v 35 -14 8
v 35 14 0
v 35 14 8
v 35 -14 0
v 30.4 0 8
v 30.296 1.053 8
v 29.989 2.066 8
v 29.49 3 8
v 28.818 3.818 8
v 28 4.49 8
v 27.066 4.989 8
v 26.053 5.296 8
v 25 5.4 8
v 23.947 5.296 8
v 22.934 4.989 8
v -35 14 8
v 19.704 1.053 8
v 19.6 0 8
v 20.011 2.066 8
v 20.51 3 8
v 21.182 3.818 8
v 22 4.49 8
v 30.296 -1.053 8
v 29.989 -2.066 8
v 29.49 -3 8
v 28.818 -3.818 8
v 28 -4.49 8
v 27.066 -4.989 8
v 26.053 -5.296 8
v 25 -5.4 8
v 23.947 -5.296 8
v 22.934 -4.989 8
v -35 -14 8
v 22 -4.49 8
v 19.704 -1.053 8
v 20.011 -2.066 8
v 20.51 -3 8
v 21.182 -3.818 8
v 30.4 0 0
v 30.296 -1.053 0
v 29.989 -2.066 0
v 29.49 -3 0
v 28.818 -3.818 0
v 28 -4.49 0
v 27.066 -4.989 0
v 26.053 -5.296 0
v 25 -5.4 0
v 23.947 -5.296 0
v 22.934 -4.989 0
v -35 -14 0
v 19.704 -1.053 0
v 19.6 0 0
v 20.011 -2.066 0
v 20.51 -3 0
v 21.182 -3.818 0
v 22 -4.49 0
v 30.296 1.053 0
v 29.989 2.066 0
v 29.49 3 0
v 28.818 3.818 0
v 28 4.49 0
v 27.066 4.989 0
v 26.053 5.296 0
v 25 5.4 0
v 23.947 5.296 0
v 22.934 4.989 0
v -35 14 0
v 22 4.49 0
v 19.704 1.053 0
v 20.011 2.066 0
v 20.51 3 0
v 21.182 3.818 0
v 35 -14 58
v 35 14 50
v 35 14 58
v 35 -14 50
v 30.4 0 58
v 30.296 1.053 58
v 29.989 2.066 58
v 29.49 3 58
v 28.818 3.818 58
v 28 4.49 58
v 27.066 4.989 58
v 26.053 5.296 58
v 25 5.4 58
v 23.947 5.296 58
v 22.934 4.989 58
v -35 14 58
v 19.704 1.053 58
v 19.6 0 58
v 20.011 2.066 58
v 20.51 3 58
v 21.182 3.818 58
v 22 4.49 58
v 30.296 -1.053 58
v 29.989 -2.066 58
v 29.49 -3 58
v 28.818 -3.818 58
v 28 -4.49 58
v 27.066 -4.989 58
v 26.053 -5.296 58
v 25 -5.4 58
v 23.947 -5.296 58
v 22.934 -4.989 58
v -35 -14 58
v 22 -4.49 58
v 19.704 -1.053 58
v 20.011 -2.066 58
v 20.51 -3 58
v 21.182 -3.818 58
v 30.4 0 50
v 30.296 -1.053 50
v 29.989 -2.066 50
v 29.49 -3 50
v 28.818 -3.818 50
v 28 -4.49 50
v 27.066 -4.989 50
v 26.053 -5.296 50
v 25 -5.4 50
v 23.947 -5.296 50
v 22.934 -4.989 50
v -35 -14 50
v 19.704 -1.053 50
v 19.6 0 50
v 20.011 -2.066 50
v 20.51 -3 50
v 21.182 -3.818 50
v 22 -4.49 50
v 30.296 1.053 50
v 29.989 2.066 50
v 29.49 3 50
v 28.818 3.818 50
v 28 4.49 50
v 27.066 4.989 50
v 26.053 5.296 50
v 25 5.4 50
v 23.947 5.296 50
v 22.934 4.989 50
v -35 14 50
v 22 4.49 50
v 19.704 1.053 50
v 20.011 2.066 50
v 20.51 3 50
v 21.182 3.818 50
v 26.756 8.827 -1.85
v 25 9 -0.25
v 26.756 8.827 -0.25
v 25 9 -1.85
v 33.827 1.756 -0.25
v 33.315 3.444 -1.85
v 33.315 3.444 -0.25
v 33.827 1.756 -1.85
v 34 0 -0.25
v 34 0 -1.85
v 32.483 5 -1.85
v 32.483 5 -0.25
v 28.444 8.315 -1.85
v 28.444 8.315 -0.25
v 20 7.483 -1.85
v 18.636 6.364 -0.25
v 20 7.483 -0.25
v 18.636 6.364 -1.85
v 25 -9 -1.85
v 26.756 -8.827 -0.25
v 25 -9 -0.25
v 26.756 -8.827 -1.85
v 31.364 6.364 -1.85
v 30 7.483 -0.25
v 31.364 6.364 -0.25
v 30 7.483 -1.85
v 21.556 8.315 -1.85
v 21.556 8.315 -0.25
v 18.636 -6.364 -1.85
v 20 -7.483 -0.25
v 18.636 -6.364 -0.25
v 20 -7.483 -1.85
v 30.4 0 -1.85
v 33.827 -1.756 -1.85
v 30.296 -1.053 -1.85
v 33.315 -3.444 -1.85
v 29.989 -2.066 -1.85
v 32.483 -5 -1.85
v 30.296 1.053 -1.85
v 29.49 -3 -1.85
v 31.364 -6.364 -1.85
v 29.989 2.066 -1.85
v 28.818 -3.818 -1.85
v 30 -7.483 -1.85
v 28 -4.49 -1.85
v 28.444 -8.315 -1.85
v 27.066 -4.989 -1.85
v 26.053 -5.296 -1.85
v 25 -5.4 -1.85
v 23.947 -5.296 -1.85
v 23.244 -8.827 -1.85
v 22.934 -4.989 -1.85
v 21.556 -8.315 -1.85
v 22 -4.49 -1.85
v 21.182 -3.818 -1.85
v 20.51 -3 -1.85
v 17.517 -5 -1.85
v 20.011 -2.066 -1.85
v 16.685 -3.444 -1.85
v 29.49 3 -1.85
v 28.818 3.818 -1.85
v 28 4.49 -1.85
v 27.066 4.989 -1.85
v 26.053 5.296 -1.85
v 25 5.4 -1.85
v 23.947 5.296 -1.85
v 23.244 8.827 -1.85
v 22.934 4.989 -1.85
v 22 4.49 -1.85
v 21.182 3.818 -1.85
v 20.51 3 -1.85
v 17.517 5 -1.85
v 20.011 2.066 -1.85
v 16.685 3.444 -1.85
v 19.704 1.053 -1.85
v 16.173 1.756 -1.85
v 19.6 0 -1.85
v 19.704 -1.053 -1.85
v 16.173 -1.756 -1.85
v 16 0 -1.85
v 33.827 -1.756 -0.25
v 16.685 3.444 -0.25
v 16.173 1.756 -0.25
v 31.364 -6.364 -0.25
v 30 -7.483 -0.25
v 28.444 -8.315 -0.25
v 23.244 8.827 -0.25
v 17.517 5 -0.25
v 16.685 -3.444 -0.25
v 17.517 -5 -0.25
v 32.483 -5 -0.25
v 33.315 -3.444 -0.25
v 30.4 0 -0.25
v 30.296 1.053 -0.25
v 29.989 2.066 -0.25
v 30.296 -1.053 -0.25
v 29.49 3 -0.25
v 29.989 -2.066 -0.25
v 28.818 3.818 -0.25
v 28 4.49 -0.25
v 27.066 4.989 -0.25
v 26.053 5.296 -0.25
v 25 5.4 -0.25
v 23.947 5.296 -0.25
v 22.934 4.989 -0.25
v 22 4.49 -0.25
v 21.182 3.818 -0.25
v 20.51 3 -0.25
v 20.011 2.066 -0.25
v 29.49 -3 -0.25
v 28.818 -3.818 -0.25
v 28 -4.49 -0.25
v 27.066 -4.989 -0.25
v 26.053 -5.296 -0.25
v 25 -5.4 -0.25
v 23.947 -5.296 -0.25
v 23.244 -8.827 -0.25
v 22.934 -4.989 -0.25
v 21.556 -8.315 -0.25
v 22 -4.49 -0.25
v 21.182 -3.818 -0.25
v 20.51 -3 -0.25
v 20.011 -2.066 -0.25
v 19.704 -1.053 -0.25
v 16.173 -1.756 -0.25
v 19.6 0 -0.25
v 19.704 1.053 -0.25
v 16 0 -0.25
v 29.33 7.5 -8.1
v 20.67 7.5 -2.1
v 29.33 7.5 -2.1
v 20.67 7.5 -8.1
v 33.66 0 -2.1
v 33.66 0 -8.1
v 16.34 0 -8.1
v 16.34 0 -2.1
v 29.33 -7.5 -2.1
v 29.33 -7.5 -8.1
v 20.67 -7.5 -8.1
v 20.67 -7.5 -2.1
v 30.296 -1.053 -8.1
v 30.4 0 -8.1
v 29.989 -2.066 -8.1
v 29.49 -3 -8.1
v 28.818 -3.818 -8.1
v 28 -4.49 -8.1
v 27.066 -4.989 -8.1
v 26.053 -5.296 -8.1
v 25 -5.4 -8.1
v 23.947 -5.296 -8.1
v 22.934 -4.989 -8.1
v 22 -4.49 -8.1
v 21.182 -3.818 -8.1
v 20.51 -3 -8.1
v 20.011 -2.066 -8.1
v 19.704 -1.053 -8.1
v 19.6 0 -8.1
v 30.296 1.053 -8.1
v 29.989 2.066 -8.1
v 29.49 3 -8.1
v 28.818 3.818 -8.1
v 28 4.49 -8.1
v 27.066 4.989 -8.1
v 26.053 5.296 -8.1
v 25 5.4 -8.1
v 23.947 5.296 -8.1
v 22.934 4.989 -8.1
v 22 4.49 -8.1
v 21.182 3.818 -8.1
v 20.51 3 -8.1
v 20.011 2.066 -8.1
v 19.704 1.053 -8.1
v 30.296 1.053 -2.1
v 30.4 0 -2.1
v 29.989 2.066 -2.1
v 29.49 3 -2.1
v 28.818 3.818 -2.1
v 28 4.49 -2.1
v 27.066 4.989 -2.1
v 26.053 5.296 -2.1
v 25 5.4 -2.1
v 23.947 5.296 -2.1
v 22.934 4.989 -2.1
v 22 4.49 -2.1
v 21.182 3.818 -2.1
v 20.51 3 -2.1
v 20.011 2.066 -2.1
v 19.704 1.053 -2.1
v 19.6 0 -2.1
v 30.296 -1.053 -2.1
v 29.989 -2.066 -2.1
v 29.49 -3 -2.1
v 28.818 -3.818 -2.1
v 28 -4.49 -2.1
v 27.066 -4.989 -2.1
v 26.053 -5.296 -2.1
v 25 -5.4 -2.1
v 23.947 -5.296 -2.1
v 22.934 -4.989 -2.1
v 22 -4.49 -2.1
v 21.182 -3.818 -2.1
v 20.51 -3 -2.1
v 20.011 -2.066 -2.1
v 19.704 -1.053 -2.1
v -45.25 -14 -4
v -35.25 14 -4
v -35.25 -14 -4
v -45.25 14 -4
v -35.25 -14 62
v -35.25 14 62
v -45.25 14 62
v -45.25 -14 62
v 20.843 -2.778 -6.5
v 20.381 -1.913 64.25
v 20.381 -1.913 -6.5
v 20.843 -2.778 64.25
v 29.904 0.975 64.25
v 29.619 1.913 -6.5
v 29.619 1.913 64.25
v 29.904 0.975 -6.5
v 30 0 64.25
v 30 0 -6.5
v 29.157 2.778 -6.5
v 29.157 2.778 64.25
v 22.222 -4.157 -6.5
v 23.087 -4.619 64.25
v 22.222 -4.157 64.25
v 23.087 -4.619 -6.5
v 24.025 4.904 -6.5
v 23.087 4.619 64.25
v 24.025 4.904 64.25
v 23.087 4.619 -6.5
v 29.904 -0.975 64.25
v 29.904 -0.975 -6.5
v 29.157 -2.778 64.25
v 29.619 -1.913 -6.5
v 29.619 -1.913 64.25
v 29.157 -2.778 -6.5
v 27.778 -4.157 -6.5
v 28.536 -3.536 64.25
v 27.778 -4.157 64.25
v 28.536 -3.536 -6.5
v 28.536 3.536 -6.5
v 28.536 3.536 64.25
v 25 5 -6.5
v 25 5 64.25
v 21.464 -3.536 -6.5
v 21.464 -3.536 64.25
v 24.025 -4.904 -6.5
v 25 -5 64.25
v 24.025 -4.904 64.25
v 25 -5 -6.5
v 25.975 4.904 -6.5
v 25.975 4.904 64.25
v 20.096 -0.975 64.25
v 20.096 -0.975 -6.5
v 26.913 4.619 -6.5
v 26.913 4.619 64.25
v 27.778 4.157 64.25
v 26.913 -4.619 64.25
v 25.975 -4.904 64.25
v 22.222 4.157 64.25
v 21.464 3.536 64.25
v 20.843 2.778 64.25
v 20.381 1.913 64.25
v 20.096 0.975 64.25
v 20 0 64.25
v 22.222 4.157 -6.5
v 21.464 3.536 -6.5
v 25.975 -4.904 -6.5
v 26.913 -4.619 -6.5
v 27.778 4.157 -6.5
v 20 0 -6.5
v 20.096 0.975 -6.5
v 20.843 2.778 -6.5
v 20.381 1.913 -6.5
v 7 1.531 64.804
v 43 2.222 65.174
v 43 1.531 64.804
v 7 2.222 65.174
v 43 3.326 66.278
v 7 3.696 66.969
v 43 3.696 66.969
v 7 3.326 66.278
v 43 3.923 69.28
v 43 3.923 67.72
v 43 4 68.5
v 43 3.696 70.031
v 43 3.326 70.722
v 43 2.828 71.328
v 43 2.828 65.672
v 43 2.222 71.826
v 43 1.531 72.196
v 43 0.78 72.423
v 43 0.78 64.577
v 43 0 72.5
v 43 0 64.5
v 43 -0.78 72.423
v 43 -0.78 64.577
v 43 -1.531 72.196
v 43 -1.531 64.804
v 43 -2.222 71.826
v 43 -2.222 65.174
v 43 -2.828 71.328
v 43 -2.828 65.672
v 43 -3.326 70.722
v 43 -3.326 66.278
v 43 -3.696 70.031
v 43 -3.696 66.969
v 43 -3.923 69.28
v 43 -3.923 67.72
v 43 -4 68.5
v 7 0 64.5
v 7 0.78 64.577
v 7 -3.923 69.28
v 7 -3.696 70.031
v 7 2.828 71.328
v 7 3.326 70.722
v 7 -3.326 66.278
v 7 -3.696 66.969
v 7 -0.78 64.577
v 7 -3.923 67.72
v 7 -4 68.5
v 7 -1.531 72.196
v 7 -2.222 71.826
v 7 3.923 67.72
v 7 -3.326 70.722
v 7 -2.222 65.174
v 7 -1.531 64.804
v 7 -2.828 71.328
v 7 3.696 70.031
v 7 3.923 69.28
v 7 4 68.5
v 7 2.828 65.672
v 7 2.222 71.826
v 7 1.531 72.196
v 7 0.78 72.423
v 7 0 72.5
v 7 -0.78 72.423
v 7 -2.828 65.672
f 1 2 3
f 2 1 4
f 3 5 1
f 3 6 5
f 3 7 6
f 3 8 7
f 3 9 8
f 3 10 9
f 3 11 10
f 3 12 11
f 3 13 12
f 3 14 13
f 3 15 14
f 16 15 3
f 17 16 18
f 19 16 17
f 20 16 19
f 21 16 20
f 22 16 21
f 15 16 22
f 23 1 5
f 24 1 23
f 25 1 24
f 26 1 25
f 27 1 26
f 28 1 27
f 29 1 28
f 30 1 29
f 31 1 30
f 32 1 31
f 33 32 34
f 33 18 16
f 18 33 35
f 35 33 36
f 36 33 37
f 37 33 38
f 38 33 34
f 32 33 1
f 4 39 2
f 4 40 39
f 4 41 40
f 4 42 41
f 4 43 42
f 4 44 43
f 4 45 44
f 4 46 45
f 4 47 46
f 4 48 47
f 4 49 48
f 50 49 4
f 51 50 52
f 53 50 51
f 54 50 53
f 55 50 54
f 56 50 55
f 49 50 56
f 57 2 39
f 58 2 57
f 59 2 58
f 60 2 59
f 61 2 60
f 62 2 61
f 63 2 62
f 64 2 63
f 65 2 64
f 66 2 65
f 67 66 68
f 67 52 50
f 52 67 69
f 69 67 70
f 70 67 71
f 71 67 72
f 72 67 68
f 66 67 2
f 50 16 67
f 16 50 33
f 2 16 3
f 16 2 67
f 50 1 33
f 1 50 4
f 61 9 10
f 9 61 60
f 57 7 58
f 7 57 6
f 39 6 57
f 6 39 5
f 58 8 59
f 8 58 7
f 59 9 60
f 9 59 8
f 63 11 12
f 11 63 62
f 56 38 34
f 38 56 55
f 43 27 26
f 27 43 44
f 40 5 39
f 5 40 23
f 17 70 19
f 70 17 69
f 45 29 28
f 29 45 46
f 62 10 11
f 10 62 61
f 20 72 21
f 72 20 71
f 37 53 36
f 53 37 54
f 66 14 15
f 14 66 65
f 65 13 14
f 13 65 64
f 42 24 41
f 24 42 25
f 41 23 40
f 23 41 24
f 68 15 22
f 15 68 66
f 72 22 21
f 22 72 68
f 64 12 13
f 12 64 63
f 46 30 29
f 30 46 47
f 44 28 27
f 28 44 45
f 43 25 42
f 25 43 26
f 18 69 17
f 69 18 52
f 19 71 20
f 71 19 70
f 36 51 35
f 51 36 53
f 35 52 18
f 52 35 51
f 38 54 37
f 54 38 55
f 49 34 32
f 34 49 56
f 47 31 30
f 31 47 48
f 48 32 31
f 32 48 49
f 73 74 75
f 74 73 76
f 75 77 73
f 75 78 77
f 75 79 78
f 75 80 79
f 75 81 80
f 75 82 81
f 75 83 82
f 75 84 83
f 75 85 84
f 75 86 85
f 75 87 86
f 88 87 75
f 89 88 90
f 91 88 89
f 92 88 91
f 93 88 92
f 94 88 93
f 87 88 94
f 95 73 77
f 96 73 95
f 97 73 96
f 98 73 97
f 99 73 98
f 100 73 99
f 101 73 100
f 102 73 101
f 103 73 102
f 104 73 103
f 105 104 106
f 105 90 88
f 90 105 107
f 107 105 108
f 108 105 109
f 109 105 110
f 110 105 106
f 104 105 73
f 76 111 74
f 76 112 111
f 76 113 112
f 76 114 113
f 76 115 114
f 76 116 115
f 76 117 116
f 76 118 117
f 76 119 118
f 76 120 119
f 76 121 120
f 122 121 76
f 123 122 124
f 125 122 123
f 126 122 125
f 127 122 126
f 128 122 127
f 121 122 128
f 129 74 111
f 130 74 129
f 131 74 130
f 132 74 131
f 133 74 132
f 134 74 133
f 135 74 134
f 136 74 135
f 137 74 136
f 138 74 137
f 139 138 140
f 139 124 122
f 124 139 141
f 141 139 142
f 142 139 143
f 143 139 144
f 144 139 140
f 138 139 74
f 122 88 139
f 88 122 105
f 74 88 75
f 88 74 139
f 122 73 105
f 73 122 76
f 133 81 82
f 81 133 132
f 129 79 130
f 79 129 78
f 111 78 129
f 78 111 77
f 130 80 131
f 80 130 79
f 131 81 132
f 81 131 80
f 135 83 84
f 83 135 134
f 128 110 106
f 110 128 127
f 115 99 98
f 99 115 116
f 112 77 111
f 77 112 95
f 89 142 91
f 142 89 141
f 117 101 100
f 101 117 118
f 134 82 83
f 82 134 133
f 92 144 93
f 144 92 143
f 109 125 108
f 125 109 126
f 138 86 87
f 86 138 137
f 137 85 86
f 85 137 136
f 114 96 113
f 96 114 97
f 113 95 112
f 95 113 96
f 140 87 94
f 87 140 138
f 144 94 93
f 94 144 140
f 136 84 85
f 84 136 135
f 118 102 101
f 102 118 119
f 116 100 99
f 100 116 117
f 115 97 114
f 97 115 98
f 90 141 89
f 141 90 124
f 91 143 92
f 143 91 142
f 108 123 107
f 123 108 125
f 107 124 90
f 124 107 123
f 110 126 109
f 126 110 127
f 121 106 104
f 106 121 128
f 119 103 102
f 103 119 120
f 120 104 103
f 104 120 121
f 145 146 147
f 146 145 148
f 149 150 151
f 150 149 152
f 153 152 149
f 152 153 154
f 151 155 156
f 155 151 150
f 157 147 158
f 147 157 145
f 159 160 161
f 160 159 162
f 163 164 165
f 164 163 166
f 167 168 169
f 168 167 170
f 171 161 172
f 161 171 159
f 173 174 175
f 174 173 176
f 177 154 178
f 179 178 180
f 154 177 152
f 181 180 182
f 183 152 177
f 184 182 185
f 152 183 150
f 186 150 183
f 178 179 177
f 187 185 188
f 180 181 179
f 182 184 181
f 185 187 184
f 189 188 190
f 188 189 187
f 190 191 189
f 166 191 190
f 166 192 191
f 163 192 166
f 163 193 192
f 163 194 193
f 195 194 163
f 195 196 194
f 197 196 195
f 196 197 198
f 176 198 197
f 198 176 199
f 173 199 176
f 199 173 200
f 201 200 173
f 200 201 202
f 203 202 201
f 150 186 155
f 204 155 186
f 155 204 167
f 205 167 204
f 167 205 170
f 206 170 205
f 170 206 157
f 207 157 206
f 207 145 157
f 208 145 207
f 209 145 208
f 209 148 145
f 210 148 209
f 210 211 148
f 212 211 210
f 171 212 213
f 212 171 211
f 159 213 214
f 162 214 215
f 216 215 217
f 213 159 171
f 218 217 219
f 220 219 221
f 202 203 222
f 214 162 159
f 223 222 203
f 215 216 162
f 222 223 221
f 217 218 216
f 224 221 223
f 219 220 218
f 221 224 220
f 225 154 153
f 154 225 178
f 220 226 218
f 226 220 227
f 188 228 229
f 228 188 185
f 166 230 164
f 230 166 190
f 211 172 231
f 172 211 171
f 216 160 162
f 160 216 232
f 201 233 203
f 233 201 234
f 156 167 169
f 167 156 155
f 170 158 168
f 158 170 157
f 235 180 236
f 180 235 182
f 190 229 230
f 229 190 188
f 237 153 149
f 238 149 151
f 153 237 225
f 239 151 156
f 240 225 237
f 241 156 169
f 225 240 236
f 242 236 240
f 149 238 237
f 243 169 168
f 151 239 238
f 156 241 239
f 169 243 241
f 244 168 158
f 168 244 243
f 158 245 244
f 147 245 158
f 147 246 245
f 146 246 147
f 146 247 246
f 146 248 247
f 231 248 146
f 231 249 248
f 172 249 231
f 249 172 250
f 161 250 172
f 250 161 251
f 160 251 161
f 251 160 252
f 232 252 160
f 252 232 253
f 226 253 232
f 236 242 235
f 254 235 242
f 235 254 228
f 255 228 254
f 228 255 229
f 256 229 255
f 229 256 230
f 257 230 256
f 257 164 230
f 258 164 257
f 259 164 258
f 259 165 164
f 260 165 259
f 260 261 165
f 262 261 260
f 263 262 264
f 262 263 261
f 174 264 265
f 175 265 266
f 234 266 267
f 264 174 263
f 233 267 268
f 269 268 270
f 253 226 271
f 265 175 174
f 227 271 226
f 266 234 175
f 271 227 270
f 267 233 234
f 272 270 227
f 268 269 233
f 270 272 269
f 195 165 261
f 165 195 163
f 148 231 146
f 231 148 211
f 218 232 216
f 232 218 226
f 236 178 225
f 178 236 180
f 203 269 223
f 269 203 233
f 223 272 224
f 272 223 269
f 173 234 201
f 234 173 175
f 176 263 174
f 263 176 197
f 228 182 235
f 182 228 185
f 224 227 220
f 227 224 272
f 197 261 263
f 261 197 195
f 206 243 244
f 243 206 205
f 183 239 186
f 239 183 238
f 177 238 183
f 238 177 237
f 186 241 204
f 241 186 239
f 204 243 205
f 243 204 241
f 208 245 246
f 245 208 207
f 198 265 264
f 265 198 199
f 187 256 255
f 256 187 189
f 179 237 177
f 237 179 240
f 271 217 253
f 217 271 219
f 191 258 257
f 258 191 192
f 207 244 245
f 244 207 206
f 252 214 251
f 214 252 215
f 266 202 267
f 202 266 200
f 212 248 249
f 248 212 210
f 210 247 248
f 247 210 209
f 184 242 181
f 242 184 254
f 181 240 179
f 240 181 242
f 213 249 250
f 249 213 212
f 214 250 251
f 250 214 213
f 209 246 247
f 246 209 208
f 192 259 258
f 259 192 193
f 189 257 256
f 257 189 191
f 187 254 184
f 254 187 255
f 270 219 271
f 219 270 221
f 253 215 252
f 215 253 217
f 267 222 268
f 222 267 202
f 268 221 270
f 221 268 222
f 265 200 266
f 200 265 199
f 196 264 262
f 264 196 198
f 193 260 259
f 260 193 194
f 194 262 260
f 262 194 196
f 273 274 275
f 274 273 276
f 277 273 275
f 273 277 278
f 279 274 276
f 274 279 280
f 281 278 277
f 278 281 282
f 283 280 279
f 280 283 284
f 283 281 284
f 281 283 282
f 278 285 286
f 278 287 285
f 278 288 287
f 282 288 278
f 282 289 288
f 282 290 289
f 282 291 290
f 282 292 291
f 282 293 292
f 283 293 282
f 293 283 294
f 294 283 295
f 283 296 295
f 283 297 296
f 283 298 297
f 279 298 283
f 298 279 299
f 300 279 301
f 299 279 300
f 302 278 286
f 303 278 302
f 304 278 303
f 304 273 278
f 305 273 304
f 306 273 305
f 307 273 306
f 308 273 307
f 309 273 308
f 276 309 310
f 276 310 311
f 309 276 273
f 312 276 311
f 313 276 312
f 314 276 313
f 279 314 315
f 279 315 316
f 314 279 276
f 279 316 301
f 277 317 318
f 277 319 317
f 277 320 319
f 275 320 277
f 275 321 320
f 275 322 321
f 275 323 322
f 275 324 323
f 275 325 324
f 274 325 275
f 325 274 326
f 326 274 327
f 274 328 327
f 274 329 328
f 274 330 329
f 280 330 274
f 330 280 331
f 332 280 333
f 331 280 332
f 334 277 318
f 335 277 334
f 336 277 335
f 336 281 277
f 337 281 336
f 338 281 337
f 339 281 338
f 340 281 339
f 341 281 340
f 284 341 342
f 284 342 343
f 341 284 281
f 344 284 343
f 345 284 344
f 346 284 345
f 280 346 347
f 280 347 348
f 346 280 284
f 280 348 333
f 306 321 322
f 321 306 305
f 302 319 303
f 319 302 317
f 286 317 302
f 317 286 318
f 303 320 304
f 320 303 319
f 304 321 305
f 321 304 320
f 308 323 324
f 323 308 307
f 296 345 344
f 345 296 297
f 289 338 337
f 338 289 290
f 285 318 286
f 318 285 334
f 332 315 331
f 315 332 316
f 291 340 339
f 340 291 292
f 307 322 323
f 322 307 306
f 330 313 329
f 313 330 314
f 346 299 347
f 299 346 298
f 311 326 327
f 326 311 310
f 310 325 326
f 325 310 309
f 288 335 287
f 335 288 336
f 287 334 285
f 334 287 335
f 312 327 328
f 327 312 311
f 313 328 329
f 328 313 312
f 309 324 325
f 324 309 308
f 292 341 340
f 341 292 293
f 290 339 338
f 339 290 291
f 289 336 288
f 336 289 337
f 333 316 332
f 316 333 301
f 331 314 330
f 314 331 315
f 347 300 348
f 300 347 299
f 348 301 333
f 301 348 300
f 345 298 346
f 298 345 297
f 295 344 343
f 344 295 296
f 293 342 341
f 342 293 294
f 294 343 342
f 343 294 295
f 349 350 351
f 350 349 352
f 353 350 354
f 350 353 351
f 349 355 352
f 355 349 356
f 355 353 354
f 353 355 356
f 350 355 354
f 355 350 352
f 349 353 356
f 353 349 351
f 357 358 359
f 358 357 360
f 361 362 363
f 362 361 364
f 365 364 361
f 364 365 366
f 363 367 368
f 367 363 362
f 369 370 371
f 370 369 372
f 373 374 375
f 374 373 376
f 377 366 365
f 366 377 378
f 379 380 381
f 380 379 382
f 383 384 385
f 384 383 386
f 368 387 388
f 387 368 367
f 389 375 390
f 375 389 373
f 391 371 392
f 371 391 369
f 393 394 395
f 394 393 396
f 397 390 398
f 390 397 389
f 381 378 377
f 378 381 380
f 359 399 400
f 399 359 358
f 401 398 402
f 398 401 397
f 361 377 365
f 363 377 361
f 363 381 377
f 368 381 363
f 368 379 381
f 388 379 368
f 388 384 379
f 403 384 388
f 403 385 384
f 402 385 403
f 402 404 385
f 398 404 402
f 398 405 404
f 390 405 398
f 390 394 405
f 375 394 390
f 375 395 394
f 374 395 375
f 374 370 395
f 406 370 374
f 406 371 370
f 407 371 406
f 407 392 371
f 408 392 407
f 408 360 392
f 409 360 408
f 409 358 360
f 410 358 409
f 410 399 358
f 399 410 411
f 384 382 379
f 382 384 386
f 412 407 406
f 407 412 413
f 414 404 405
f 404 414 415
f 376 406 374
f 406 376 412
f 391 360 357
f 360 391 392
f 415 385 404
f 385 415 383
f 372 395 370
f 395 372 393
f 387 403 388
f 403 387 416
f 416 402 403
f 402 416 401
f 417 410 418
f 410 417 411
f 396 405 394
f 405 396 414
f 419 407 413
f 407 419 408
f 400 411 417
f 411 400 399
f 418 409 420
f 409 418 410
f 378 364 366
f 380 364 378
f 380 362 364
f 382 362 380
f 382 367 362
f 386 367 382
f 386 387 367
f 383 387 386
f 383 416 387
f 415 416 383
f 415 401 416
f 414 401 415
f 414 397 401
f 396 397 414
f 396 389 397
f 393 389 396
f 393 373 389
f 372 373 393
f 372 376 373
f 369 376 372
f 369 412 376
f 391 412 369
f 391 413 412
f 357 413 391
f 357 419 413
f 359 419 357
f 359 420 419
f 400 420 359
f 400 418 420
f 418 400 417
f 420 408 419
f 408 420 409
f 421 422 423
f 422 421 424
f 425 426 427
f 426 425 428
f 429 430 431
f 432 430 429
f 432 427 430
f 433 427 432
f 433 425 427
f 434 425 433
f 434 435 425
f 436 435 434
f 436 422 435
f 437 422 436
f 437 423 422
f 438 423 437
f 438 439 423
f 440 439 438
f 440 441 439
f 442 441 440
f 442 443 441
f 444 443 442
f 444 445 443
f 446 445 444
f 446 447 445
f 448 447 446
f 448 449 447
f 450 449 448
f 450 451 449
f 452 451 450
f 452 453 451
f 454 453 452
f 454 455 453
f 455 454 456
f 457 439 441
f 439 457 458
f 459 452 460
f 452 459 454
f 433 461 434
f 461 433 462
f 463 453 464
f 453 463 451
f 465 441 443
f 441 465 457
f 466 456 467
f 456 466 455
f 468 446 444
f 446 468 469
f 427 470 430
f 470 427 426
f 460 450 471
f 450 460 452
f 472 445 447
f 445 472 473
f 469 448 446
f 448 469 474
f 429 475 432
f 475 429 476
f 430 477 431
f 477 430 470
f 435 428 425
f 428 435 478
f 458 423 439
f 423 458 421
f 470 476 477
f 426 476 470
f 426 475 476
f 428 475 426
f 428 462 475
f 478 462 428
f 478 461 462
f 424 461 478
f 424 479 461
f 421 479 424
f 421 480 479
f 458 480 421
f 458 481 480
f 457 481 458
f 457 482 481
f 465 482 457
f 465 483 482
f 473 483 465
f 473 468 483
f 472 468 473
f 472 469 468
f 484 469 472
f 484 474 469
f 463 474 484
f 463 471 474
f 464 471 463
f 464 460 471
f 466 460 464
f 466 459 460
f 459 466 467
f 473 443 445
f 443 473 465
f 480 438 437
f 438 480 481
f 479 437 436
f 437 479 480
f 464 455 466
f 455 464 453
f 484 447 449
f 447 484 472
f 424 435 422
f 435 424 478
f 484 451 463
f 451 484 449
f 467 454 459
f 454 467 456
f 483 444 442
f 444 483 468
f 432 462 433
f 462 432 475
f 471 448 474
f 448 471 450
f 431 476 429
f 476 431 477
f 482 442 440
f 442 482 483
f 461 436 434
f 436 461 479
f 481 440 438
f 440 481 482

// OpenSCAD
$fn = 32;

// ------------------------------------------------------------------------
// C clamp: throat 50 mm, screw d10
// Every part is its own module, assembly() places every instance.
// ------------------------------------------------------------------------

// --- part 1 ---
module clamp_arm() {
  difference() {
    translate([-35, -14, 0]) cube([70, 28, 8]);
    translate([25, 0, -1]) cylinder(h = 10, d = 10.8);
  }
}

// --- part 2 ---
module clamp_spine() {
  difference() {
    translate([-33, -14, 0]) cube([66, 28, 10]);
  }
}

// --- part 3 ---
module clamp_screw() {
  translate([0, 0, -35.375]) cylinder(h = 70.75, d = 10);
}

// --- part 4 ---
module clamp_washer() {
  difference() {
      translate([0, 0, 0]) cylinder(h = 1.6, d = 18);
      translate([0, 0, -1]) cylinder(h = 3.6, d = 10.8);
    }
}

// --- part 5 ---
module clamp_nut() {
  difference() {
    linear_extrude(height = 6) polygon(points = [[8.66, 0], [4.33, 7.5], [-4.33, 7.5], [-8.66, 0], [-4.33, -7.5], [4.33, -7.5]]);
    translate([0, 0, -1]) cylinder(h = 8, d = 10.8);
  }
}

// --- part 6 ---
module tommy_bar() {
  translate([0, 0, -18]) cylinder(h = 36, d = 8);
}

// --- assembly ---
module assembly() {
  color([0.80, 0.24, 0.20]) translate([0, 0, 0]) rotate([0, 0, 0]) clamp_arm();
  color([0.20, 0.45, 0.75]) translate([0, 0, 50]) rotate([0, 0, 0]) clamp_arm();
  color([0.25, 0.62, 0.32]) translate([-45.25, 0, 29]) rotate([0, 90, 0]) clamp_spine();
  color([0.92, 0.70, 0.18]) translate([25, 0, 28.875]) rotate([0, 0, 0]) clamp_screw();
  color([0.58, 0.35, 0.70]) translate([25, 0, -1.85]) rotate([0, 0, 0]) clamp_washer();
  color([0.16, 0.66, 0.66]) translate([25, 0, -8.1]) rotate([0, 0, 0]) clamp_nut();
  color([0.85, 0.48, 0.18]) translate([25, 0, 68.5]) rotate([0, 90, 0]) tommy_bar();
}

assembly();
